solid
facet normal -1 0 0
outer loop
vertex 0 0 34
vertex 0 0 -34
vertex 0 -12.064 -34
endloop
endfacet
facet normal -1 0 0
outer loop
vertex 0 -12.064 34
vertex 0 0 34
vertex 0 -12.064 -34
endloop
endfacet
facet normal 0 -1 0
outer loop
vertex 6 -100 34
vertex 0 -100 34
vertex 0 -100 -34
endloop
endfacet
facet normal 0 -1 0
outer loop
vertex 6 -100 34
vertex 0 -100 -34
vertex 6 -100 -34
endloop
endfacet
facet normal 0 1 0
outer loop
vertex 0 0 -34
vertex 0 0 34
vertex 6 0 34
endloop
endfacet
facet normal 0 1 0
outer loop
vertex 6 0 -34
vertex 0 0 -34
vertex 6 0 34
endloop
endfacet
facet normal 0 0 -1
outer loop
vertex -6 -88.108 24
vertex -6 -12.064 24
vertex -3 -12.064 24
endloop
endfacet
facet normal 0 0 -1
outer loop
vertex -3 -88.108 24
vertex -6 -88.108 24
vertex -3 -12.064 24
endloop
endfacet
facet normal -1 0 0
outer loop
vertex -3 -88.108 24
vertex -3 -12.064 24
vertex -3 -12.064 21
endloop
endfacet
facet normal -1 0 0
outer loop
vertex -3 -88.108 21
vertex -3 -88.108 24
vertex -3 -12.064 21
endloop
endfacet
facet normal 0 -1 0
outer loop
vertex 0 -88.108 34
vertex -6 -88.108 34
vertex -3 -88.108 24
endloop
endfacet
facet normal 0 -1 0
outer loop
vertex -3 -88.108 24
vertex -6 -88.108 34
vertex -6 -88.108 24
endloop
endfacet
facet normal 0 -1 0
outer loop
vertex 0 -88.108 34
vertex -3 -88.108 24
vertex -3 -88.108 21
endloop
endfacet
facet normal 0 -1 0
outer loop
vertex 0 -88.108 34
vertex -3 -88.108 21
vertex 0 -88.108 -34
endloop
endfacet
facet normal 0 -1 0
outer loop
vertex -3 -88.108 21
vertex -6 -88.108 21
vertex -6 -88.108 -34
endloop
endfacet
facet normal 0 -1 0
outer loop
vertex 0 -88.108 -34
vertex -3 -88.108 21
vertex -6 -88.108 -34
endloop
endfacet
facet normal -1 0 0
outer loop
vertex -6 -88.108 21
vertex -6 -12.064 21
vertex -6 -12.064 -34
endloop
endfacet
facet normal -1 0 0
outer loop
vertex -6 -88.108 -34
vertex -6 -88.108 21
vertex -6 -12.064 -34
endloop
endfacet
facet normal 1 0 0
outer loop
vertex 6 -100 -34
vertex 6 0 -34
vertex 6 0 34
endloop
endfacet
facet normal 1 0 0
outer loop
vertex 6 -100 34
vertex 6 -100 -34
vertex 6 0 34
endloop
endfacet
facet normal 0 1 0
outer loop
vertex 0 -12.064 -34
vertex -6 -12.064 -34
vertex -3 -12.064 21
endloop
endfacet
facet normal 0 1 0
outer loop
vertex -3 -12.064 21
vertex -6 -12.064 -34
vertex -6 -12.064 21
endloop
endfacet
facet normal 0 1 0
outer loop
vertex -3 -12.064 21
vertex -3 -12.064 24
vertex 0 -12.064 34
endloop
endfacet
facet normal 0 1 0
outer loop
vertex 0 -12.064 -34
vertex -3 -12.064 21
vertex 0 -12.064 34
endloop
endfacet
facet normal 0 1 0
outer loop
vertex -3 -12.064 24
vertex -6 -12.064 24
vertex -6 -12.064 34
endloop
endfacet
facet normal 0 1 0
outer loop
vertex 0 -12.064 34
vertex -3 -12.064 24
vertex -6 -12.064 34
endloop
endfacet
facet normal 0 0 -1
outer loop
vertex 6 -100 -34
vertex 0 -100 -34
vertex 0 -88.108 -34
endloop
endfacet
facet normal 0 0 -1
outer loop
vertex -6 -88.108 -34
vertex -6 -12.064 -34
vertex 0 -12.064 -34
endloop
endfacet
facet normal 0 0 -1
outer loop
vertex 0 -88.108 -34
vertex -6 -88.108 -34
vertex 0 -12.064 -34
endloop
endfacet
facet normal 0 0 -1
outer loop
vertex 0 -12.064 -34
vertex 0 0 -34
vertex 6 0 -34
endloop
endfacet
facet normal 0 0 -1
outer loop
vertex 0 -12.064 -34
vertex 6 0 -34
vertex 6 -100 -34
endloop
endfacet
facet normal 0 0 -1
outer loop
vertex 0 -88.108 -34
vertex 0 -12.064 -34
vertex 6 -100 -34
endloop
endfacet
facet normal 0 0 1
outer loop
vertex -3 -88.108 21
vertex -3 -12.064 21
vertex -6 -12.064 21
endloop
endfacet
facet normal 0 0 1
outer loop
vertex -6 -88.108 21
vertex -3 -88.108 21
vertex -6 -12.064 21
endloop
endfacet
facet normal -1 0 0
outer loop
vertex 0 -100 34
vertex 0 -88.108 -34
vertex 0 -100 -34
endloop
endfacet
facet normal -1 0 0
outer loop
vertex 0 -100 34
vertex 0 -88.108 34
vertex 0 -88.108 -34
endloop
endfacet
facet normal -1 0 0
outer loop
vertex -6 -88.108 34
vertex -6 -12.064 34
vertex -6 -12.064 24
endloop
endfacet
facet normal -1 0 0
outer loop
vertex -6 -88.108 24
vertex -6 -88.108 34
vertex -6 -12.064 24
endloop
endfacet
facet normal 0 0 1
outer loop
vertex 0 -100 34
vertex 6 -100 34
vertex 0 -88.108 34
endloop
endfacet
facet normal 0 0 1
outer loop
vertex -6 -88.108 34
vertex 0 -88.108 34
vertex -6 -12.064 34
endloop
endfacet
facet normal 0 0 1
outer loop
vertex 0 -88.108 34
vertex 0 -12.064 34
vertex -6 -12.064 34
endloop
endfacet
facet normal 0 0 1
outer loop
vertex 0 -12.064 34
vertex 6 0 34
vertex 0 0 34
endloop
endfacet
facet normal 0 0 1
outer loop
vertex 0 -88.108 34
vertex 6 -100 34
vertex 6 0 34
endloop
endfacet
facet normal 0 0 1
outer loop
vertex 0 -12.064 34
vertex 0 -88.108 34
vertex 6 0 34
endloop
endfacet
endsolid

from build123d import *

# Parameters (mm, degrees)
F1_DEPTH = 100
F3_DEPTH = 6
F5_DEPTH = 6


with BuildPart() as f1:
    # F0 (on Front) → F1 (new body)
    with BuildSketch(Plane.XZ):
        Polygon((-6, -34), (6, -34), (6, 34), (-6, 34), (-6, 24), (-3, 24), (-3, 21), (-6, 21), align=None)
    extrude(amount=F1_DEPTH)

    # F2 (on face) → F3 (cut)
    with BuildSketch(Plane(origin=(-6, 0, 0), x_dir=(0, -1, 0), z_dir=(-1, 0, 0))):
        Polygon((100.127715, -34), (100.127715, 34.181964), (88.127715, 34.181964), (88.107921, 34.181964), (88.107921, -34), align=None)
    extrude(amount=-F3_DEPTH, mode=Mode.SUBTRACT)

    # F4 (on face) → F5 (cut)
    with BuildSketch(Plane(origin=(-6, 0, 0), x_dir=(0, -1, 0), z_dir=(-1, 0, 0))):
        Polygon((12.064485, 34.181964), (0.814515, 34.181964), (0, 34.181964), (0, -34), (12.064485, -34), align=None)
    extrude(amount=-F5_DEPTH, mode=Mode.SUBTRACT)


solid = f1.part
